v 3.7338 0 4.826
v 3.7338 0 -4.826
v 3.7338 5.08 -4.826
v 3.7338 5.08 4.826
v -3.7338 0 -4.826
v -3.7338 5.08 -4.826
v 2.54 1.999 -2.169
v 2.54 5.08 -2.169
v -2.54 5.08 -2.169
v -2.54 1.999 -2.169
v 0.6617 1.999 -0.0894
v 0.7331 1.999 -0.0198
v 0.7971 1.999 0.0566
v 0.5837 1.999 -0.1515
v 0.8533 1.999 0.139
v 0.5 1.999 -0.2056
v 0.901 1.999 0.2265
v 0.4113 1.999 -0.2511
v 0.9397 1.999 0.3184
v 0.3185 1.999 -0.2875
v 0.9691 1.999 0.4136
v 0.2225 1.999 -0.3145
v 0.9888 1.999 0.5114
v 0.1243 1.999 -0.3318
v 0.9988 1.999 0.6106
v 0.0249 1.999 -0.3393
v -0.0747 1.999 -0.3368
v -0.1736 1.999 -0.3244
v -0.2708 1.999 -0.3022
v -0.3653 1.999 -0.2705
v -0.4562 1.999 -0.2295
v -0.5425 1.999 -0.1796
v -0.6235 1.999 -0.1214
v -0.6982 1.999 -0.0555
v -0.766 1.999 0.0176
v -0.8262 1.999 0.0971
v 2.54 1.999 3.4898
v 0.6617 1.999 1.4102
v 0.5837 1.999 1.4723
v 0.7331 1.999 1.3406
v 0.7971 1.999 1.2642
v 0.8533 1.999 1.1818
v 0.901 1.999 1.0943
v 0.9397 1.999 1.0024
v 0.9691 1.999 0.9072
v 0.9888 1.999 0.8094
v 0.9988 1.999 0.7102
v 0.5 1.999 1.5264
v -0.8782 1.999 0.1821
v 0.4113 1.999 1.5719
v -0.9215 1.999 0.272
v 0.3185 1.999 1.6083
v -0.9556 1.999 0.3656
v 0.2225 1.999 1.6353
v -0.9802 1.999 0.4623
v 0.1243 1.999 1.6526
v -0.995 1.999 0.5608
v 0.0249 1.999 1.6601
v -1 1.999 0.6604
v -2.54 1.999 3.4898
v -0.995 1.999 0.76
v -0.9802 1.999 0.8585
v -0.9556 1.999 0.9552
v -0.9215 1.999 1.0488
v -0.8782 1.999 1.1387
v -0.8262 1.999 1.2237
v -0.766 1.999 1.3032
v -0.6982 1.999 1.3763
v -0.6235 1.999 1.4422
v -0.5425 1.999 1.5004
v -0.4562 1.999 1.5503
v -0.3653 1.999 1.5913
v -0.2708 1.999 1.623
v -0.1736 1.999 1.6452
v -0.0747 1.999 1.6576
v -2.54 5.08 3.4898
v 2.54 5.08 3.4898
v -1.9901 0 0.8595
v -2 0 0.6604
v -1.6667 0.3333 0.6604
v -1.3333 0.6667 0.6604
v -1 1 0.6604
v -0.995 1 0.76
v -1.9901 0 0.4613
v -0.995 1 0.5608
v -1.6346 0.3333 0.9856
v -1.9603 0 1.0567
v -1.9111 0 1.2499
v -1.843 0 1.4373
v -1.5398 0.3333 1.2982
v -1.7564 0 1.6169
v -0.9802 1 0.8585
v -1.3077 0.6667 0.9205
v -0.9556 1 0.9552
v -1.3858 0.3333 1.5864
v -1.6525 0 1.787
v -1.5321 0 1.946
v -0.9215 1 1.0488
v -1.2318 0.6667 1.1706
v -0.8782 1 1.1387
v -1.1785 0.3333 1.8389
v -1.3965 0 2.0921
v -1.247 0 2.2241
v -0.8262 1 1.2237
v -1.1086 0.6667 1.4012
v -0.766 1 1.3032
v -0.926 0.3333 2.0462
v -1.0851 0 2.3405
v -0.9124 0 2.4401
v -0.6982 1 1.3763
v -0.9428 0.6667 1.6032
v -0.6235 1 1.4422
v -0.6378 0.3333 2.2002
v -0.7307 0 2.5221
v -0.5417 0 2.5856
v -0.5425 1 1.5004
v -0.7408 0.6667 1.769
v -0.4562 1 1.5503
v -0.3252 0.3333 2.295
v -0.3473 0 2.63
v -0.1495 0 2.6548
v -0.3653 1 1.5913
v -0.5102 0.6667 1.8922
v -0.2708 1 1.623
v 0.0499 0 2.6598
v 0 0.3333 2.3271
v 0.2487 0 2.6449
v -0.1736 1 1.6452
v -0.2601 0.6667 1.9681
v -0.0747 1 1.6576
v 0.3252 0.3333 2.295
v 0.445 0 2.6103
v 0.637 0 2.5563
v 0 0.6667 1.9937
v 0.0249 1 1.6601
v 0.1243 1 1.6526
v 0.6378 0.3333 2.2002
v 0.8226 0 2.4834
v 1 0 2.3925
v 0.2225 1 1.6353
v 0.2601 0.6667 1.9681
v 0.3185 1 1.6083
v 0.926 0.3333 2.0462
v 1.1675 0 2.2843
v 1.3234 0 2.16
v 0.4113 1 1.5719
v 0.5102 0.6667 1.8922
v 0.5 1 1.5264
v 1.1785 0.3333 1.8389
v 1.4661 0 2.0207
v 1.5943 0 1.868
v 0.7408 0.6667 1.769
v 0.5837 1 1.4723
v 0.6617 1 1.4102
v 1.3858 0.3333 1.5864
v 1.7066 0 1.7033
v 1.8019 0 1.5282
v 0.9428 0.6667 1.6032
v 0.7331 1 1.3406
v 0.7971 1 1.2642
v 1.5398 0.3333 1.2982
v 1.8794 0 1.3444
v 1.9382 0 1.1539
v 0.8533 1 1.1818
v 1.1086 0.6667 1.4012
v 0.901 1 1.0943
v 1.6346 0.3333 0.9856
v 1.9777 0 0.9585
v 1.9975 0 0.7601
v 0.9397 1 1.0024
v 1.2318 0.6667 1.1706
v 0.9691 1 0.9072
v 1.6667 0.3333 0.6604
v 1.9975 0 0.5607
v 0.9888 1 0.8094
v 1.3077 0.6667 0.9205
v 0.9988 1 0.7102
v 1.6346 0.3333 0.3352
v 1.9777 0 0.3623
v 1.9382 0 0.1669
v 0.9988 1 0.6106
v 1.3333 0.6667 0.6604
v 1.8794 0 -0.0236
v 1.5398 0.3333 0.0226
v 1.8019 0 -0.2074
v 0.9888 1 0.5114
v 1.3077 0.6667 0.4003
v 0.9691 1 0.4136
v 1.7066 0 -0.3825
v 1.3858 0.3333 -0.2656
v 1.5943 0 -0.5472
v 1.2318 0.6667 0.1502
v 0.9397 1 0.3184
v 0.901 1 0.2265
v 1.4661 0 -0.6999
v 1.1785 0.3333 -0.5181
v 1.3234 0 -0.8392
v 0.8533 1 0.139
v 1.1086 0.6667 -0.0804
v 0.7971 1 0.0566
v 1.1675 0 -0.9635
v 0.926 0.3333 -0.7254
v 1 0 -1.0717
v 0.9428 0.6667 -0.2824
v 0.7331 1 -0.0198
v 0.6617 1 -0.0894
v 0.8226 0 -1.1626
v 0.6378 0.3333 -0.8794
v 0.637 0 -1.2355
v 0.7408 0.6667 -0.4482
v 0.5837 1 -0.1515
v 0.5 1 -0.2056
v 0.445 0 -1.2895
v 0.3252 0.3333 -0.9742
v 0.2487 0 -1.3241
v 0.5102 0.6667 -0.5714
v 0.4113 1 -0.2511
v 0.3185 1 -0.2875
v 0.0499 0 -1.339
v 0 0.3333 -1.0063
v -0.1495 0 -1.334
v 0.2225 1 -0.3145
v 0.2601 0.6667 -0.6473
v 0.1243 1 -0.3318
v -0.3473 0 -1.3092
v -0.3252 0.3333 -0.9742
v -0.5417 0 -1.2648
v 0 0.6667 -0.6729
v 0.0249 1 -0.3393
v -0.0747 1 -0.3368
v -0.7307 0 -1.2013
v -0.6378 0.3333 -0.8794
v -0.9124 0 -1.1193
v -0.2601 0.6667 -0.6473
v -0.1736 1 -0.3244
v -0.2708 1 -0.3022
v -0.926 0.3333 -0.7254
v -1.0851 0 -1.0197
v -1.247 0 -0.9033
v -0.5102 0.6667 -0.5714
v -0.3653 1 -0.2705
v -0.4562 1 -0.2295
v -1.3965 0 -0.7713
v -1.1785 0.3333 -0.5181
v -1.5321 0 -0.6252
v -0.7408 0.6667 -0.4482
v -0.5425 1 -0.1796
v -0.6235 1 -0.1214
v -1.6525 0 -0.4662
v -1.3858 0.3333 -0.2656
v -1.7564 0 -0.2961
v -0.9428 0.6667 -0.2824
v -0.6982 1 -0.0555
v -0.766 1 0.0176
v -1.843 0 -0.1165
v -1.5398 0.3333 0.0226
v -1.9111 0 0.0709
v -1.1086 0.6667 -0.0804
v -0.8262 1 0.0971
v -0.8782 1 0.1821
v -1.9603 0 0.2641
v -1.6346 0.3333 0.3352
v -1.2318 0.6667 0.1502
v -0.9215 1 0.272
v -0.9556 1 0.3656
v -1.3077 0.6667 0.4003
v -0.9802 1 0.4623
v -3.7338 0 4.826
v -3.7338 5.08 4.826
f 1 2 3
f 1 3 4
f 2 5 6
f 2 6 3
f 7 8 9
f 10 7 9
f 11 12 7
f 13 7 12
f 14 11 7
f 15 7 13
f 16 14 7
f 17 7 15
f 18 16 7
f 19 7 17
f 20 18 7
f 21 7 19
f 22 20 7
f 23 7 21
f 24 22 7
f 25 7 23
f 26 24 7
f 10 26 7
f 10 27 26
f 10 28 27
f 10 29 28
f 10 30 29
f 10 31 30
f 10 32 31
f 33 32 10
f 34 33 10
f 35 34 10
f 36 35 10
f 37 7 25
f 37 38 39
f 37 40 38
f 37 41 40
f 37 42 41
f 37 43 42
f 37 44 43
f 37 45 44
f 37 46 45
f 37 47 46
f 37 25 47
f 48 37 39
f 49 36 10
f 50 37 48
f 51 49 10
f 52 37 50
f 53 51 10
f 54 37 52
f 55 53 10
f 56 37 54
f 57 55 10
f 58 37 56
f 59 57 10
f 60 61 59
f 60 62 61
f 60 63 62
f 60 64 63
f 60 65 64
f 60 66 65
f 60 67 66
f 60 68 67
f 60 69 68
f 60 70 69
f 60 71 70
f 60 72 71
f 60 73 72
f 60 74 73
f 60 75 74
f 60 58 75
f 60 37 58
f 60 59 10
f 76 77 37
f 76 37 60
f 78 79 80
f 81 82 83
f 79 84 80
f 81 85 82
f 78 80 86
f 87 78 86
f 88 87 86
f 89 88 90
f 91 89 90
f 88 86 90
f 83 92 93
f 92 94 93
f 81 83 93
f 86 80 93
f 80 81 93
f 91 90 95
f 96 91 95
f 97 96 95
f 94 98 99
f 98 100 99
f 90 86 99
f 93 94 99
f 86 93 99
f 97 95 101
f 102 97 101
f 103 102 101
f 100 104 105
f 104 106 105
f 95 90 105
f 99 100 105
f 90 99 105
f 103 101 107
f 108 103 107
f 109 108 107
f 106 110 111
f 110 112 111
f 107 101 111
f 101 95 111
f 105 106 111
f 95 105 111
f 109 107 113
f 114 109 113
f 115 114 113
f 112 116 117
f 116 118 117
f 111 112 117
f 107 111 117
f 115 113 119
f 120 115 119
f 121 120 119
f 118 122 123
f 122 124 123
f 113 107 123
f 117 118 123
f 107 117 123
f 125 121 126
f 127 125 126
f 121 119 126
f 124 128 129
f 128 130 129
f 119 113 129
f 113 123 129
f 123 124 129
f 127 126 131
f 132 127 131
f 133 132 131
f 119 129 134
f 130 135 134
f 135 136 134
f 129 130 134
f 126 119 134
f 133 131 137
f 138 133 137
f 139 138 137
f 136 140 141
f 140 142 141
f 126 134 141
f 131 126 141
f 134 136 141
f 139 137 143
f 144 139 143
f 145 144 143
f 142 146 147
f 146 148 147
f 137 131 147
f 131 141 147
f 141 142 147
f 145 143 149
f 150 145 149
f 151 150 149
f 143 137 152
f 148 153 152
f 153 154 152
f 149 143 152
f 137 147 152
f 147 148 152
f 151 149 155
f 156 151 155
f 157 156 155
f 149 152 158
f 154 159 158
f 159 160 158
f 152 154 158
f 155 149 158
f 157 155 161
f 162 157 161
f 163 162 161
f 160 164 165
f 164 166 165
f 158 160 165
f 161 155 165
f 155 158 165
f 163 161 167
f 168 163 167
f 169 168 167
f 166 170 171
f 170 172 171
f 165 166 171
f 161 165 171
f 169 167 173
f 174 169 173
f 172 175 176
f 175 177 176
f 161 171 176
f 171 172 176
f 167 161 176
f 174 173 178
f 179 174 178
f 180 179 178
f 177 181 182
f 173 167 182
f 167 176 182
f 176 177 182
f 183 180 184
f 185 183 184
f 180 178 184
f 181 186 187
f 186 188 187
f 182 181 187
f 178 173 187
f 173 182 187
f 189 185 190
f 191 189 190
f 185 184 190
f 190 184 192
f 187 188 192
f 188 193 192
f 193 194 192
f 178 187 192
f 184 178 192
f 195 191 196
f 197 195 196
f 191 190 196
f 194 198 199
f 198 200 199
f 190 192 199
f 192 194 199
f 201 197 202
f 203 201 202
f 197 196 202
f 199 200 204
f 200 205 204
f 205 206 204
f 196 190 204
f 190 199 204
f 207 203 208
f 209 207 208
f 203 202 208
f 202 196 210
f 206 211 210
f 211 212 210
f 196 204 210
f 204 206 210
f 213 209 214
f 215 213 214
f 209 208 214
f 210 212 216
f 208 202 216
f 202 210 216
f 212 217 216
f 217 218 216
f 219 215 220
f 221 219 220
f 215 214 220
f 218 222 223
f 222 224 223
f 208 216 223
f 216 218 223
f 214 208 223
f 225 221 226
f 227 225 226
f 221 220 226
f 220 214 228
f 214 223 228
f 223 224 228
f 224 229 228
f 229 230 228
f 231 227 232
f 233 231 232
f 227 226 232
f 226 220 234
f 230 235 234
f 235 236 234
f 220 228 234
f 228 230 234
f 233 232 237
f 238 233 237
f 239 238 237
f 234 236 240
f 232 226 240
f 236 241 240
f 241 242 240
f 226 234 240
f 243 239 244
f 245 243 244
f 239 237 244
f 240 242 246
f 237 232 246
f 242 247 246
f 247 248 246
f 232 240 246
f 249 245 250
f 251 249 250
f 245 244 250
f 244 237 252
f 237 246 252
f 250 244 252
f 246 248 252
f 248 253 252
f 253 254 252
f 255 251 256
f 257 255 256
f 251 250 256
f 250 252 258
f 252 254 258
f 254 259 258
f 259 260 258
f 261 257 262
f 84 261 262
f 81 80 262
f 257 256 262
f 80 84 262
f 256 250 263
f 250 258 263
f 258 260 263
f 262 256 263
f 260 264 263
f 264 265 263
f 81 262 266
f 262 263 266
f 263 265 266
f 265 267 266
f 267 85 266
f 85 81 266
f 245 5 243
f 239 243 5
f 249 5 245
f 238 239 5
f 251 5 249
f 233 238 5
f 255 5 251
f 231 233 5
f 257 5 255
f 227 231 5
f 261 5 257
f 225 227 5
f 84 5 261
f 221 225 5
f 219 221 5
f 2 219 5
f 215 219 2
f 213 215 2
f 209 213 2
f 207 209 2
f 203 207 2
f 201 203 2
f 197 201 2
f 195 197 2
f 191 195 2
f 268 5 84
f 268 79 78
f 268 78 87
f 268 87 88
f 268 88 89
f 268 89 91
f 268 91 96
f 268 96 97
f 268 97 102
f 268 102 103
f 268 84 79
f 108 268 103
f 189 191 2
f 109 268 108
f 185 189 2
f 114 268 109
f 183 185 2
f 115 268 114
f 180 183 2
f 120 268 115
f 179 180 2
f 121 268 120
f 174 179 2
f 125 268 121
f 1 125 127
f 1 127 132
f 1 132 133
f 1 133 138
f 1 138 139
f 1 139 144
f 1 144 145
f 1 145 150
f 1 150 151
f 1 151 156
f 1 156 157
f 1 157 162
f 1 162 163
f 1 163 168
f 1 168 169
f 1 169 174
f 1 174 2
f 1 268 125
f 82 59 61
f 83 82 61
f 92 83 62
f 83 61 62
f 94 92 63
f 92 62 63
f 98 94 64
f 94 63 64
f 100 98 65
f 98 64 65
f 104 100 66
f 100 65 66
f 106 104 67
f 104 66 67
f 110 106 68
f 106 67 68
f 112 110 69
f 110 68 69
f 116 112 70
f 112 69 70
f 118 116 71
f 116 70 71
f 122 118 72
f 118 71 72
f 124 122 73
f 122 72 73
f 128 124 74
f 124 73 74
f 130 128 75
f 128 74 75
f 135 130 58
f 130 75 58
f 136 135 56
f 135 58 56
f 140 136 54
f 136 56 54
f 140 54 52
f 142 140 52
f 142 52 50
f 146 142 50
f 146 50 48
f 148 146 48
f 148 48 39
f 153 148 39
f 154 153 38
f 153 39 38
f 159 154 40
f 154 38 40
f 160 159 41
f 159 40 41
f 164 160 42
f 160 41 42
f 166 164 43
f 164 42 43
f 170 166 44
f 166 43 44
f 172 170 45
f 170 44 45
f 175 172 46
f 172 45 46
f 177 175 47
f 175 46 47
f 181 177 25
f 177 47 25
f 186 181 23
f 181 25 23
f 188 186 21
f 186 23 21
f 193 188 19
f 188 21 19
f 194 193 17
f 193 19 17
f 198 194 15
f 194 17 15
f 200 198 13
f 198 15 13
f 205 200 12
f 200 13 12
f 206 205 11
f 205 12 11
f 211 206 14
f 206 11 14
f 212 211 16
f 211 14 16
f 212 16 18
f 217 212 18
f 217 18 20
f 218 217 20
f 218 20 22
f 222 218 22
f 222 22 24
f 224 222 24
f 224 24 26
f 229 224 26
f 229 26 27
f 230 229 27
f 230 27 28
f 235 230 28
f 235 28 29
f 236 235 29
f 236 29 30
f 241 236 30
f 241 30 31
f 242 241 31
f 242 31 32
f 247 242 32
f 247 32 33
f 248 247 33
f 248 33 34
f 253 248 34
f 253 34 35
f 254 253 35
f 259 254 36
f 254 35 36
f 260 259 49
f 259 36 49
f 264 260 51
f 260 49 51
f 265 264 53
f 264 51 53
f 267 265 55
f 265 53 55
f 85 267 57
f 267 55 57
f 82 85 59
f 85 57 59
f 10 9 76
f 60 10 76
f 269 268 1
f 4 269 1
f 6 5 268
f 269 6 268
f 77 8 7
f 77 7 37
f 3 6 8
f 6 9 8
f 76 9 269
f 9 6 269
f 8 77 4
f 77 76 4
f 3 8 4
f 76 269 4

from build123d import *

# Parameters (mm, degrees)
F0_W           = 7.4676
F0_H           = 9.652
F0_R           = 1
F1_DEPTH       = 5.08
F2_D           = 2
F2_CSINK_D     = 4
F2_CSINK_ANGLE = 90
F3_W           = 5.08
F3_H           = 5.658844
F3_R           = 1
F4_DEPTH       = 3.08102


with BuildPart() as f1:
    # F0 (on Front) → F1 (new body)
    with BuildSketch(Plane.XZ):
        Rectangle(F0_W, F0_H)
        with Locations((0, 0.6604)):
            Circle(F0_R, mode=Mode.SUBTRACT)
        with Locations((0, 0.6604)):
            Circle(F0_R)
    extrude(amount=-F1_DEPTH)

    # F2 (through all)
    with Locations(Plane.XZ):
        with Locations((0, 0.6604)):
            CounterSinkHole(F2_D / 2, F2_CSINK_D / 2, counter_sink_angle=F2_CSINK_ANGLE)

    # F3 (on face) → F4 (cut)
    with BuildSketch(Plane(origin=(0, 5.08, 0), x_dir=(-1, 0, 0), z_dir=(0, 1, 0))):
        with Locations((0, 0.6604)):
            Rectangle(F3_W, F3_H)
        with Locations((0, 0.6604)):
            Circle(F3_R, mode=Mode.SUBTRACT)
    extrude(amount=-F4_DEPTH, mode=Mode.SUBTRACT)


solid = f1.part
